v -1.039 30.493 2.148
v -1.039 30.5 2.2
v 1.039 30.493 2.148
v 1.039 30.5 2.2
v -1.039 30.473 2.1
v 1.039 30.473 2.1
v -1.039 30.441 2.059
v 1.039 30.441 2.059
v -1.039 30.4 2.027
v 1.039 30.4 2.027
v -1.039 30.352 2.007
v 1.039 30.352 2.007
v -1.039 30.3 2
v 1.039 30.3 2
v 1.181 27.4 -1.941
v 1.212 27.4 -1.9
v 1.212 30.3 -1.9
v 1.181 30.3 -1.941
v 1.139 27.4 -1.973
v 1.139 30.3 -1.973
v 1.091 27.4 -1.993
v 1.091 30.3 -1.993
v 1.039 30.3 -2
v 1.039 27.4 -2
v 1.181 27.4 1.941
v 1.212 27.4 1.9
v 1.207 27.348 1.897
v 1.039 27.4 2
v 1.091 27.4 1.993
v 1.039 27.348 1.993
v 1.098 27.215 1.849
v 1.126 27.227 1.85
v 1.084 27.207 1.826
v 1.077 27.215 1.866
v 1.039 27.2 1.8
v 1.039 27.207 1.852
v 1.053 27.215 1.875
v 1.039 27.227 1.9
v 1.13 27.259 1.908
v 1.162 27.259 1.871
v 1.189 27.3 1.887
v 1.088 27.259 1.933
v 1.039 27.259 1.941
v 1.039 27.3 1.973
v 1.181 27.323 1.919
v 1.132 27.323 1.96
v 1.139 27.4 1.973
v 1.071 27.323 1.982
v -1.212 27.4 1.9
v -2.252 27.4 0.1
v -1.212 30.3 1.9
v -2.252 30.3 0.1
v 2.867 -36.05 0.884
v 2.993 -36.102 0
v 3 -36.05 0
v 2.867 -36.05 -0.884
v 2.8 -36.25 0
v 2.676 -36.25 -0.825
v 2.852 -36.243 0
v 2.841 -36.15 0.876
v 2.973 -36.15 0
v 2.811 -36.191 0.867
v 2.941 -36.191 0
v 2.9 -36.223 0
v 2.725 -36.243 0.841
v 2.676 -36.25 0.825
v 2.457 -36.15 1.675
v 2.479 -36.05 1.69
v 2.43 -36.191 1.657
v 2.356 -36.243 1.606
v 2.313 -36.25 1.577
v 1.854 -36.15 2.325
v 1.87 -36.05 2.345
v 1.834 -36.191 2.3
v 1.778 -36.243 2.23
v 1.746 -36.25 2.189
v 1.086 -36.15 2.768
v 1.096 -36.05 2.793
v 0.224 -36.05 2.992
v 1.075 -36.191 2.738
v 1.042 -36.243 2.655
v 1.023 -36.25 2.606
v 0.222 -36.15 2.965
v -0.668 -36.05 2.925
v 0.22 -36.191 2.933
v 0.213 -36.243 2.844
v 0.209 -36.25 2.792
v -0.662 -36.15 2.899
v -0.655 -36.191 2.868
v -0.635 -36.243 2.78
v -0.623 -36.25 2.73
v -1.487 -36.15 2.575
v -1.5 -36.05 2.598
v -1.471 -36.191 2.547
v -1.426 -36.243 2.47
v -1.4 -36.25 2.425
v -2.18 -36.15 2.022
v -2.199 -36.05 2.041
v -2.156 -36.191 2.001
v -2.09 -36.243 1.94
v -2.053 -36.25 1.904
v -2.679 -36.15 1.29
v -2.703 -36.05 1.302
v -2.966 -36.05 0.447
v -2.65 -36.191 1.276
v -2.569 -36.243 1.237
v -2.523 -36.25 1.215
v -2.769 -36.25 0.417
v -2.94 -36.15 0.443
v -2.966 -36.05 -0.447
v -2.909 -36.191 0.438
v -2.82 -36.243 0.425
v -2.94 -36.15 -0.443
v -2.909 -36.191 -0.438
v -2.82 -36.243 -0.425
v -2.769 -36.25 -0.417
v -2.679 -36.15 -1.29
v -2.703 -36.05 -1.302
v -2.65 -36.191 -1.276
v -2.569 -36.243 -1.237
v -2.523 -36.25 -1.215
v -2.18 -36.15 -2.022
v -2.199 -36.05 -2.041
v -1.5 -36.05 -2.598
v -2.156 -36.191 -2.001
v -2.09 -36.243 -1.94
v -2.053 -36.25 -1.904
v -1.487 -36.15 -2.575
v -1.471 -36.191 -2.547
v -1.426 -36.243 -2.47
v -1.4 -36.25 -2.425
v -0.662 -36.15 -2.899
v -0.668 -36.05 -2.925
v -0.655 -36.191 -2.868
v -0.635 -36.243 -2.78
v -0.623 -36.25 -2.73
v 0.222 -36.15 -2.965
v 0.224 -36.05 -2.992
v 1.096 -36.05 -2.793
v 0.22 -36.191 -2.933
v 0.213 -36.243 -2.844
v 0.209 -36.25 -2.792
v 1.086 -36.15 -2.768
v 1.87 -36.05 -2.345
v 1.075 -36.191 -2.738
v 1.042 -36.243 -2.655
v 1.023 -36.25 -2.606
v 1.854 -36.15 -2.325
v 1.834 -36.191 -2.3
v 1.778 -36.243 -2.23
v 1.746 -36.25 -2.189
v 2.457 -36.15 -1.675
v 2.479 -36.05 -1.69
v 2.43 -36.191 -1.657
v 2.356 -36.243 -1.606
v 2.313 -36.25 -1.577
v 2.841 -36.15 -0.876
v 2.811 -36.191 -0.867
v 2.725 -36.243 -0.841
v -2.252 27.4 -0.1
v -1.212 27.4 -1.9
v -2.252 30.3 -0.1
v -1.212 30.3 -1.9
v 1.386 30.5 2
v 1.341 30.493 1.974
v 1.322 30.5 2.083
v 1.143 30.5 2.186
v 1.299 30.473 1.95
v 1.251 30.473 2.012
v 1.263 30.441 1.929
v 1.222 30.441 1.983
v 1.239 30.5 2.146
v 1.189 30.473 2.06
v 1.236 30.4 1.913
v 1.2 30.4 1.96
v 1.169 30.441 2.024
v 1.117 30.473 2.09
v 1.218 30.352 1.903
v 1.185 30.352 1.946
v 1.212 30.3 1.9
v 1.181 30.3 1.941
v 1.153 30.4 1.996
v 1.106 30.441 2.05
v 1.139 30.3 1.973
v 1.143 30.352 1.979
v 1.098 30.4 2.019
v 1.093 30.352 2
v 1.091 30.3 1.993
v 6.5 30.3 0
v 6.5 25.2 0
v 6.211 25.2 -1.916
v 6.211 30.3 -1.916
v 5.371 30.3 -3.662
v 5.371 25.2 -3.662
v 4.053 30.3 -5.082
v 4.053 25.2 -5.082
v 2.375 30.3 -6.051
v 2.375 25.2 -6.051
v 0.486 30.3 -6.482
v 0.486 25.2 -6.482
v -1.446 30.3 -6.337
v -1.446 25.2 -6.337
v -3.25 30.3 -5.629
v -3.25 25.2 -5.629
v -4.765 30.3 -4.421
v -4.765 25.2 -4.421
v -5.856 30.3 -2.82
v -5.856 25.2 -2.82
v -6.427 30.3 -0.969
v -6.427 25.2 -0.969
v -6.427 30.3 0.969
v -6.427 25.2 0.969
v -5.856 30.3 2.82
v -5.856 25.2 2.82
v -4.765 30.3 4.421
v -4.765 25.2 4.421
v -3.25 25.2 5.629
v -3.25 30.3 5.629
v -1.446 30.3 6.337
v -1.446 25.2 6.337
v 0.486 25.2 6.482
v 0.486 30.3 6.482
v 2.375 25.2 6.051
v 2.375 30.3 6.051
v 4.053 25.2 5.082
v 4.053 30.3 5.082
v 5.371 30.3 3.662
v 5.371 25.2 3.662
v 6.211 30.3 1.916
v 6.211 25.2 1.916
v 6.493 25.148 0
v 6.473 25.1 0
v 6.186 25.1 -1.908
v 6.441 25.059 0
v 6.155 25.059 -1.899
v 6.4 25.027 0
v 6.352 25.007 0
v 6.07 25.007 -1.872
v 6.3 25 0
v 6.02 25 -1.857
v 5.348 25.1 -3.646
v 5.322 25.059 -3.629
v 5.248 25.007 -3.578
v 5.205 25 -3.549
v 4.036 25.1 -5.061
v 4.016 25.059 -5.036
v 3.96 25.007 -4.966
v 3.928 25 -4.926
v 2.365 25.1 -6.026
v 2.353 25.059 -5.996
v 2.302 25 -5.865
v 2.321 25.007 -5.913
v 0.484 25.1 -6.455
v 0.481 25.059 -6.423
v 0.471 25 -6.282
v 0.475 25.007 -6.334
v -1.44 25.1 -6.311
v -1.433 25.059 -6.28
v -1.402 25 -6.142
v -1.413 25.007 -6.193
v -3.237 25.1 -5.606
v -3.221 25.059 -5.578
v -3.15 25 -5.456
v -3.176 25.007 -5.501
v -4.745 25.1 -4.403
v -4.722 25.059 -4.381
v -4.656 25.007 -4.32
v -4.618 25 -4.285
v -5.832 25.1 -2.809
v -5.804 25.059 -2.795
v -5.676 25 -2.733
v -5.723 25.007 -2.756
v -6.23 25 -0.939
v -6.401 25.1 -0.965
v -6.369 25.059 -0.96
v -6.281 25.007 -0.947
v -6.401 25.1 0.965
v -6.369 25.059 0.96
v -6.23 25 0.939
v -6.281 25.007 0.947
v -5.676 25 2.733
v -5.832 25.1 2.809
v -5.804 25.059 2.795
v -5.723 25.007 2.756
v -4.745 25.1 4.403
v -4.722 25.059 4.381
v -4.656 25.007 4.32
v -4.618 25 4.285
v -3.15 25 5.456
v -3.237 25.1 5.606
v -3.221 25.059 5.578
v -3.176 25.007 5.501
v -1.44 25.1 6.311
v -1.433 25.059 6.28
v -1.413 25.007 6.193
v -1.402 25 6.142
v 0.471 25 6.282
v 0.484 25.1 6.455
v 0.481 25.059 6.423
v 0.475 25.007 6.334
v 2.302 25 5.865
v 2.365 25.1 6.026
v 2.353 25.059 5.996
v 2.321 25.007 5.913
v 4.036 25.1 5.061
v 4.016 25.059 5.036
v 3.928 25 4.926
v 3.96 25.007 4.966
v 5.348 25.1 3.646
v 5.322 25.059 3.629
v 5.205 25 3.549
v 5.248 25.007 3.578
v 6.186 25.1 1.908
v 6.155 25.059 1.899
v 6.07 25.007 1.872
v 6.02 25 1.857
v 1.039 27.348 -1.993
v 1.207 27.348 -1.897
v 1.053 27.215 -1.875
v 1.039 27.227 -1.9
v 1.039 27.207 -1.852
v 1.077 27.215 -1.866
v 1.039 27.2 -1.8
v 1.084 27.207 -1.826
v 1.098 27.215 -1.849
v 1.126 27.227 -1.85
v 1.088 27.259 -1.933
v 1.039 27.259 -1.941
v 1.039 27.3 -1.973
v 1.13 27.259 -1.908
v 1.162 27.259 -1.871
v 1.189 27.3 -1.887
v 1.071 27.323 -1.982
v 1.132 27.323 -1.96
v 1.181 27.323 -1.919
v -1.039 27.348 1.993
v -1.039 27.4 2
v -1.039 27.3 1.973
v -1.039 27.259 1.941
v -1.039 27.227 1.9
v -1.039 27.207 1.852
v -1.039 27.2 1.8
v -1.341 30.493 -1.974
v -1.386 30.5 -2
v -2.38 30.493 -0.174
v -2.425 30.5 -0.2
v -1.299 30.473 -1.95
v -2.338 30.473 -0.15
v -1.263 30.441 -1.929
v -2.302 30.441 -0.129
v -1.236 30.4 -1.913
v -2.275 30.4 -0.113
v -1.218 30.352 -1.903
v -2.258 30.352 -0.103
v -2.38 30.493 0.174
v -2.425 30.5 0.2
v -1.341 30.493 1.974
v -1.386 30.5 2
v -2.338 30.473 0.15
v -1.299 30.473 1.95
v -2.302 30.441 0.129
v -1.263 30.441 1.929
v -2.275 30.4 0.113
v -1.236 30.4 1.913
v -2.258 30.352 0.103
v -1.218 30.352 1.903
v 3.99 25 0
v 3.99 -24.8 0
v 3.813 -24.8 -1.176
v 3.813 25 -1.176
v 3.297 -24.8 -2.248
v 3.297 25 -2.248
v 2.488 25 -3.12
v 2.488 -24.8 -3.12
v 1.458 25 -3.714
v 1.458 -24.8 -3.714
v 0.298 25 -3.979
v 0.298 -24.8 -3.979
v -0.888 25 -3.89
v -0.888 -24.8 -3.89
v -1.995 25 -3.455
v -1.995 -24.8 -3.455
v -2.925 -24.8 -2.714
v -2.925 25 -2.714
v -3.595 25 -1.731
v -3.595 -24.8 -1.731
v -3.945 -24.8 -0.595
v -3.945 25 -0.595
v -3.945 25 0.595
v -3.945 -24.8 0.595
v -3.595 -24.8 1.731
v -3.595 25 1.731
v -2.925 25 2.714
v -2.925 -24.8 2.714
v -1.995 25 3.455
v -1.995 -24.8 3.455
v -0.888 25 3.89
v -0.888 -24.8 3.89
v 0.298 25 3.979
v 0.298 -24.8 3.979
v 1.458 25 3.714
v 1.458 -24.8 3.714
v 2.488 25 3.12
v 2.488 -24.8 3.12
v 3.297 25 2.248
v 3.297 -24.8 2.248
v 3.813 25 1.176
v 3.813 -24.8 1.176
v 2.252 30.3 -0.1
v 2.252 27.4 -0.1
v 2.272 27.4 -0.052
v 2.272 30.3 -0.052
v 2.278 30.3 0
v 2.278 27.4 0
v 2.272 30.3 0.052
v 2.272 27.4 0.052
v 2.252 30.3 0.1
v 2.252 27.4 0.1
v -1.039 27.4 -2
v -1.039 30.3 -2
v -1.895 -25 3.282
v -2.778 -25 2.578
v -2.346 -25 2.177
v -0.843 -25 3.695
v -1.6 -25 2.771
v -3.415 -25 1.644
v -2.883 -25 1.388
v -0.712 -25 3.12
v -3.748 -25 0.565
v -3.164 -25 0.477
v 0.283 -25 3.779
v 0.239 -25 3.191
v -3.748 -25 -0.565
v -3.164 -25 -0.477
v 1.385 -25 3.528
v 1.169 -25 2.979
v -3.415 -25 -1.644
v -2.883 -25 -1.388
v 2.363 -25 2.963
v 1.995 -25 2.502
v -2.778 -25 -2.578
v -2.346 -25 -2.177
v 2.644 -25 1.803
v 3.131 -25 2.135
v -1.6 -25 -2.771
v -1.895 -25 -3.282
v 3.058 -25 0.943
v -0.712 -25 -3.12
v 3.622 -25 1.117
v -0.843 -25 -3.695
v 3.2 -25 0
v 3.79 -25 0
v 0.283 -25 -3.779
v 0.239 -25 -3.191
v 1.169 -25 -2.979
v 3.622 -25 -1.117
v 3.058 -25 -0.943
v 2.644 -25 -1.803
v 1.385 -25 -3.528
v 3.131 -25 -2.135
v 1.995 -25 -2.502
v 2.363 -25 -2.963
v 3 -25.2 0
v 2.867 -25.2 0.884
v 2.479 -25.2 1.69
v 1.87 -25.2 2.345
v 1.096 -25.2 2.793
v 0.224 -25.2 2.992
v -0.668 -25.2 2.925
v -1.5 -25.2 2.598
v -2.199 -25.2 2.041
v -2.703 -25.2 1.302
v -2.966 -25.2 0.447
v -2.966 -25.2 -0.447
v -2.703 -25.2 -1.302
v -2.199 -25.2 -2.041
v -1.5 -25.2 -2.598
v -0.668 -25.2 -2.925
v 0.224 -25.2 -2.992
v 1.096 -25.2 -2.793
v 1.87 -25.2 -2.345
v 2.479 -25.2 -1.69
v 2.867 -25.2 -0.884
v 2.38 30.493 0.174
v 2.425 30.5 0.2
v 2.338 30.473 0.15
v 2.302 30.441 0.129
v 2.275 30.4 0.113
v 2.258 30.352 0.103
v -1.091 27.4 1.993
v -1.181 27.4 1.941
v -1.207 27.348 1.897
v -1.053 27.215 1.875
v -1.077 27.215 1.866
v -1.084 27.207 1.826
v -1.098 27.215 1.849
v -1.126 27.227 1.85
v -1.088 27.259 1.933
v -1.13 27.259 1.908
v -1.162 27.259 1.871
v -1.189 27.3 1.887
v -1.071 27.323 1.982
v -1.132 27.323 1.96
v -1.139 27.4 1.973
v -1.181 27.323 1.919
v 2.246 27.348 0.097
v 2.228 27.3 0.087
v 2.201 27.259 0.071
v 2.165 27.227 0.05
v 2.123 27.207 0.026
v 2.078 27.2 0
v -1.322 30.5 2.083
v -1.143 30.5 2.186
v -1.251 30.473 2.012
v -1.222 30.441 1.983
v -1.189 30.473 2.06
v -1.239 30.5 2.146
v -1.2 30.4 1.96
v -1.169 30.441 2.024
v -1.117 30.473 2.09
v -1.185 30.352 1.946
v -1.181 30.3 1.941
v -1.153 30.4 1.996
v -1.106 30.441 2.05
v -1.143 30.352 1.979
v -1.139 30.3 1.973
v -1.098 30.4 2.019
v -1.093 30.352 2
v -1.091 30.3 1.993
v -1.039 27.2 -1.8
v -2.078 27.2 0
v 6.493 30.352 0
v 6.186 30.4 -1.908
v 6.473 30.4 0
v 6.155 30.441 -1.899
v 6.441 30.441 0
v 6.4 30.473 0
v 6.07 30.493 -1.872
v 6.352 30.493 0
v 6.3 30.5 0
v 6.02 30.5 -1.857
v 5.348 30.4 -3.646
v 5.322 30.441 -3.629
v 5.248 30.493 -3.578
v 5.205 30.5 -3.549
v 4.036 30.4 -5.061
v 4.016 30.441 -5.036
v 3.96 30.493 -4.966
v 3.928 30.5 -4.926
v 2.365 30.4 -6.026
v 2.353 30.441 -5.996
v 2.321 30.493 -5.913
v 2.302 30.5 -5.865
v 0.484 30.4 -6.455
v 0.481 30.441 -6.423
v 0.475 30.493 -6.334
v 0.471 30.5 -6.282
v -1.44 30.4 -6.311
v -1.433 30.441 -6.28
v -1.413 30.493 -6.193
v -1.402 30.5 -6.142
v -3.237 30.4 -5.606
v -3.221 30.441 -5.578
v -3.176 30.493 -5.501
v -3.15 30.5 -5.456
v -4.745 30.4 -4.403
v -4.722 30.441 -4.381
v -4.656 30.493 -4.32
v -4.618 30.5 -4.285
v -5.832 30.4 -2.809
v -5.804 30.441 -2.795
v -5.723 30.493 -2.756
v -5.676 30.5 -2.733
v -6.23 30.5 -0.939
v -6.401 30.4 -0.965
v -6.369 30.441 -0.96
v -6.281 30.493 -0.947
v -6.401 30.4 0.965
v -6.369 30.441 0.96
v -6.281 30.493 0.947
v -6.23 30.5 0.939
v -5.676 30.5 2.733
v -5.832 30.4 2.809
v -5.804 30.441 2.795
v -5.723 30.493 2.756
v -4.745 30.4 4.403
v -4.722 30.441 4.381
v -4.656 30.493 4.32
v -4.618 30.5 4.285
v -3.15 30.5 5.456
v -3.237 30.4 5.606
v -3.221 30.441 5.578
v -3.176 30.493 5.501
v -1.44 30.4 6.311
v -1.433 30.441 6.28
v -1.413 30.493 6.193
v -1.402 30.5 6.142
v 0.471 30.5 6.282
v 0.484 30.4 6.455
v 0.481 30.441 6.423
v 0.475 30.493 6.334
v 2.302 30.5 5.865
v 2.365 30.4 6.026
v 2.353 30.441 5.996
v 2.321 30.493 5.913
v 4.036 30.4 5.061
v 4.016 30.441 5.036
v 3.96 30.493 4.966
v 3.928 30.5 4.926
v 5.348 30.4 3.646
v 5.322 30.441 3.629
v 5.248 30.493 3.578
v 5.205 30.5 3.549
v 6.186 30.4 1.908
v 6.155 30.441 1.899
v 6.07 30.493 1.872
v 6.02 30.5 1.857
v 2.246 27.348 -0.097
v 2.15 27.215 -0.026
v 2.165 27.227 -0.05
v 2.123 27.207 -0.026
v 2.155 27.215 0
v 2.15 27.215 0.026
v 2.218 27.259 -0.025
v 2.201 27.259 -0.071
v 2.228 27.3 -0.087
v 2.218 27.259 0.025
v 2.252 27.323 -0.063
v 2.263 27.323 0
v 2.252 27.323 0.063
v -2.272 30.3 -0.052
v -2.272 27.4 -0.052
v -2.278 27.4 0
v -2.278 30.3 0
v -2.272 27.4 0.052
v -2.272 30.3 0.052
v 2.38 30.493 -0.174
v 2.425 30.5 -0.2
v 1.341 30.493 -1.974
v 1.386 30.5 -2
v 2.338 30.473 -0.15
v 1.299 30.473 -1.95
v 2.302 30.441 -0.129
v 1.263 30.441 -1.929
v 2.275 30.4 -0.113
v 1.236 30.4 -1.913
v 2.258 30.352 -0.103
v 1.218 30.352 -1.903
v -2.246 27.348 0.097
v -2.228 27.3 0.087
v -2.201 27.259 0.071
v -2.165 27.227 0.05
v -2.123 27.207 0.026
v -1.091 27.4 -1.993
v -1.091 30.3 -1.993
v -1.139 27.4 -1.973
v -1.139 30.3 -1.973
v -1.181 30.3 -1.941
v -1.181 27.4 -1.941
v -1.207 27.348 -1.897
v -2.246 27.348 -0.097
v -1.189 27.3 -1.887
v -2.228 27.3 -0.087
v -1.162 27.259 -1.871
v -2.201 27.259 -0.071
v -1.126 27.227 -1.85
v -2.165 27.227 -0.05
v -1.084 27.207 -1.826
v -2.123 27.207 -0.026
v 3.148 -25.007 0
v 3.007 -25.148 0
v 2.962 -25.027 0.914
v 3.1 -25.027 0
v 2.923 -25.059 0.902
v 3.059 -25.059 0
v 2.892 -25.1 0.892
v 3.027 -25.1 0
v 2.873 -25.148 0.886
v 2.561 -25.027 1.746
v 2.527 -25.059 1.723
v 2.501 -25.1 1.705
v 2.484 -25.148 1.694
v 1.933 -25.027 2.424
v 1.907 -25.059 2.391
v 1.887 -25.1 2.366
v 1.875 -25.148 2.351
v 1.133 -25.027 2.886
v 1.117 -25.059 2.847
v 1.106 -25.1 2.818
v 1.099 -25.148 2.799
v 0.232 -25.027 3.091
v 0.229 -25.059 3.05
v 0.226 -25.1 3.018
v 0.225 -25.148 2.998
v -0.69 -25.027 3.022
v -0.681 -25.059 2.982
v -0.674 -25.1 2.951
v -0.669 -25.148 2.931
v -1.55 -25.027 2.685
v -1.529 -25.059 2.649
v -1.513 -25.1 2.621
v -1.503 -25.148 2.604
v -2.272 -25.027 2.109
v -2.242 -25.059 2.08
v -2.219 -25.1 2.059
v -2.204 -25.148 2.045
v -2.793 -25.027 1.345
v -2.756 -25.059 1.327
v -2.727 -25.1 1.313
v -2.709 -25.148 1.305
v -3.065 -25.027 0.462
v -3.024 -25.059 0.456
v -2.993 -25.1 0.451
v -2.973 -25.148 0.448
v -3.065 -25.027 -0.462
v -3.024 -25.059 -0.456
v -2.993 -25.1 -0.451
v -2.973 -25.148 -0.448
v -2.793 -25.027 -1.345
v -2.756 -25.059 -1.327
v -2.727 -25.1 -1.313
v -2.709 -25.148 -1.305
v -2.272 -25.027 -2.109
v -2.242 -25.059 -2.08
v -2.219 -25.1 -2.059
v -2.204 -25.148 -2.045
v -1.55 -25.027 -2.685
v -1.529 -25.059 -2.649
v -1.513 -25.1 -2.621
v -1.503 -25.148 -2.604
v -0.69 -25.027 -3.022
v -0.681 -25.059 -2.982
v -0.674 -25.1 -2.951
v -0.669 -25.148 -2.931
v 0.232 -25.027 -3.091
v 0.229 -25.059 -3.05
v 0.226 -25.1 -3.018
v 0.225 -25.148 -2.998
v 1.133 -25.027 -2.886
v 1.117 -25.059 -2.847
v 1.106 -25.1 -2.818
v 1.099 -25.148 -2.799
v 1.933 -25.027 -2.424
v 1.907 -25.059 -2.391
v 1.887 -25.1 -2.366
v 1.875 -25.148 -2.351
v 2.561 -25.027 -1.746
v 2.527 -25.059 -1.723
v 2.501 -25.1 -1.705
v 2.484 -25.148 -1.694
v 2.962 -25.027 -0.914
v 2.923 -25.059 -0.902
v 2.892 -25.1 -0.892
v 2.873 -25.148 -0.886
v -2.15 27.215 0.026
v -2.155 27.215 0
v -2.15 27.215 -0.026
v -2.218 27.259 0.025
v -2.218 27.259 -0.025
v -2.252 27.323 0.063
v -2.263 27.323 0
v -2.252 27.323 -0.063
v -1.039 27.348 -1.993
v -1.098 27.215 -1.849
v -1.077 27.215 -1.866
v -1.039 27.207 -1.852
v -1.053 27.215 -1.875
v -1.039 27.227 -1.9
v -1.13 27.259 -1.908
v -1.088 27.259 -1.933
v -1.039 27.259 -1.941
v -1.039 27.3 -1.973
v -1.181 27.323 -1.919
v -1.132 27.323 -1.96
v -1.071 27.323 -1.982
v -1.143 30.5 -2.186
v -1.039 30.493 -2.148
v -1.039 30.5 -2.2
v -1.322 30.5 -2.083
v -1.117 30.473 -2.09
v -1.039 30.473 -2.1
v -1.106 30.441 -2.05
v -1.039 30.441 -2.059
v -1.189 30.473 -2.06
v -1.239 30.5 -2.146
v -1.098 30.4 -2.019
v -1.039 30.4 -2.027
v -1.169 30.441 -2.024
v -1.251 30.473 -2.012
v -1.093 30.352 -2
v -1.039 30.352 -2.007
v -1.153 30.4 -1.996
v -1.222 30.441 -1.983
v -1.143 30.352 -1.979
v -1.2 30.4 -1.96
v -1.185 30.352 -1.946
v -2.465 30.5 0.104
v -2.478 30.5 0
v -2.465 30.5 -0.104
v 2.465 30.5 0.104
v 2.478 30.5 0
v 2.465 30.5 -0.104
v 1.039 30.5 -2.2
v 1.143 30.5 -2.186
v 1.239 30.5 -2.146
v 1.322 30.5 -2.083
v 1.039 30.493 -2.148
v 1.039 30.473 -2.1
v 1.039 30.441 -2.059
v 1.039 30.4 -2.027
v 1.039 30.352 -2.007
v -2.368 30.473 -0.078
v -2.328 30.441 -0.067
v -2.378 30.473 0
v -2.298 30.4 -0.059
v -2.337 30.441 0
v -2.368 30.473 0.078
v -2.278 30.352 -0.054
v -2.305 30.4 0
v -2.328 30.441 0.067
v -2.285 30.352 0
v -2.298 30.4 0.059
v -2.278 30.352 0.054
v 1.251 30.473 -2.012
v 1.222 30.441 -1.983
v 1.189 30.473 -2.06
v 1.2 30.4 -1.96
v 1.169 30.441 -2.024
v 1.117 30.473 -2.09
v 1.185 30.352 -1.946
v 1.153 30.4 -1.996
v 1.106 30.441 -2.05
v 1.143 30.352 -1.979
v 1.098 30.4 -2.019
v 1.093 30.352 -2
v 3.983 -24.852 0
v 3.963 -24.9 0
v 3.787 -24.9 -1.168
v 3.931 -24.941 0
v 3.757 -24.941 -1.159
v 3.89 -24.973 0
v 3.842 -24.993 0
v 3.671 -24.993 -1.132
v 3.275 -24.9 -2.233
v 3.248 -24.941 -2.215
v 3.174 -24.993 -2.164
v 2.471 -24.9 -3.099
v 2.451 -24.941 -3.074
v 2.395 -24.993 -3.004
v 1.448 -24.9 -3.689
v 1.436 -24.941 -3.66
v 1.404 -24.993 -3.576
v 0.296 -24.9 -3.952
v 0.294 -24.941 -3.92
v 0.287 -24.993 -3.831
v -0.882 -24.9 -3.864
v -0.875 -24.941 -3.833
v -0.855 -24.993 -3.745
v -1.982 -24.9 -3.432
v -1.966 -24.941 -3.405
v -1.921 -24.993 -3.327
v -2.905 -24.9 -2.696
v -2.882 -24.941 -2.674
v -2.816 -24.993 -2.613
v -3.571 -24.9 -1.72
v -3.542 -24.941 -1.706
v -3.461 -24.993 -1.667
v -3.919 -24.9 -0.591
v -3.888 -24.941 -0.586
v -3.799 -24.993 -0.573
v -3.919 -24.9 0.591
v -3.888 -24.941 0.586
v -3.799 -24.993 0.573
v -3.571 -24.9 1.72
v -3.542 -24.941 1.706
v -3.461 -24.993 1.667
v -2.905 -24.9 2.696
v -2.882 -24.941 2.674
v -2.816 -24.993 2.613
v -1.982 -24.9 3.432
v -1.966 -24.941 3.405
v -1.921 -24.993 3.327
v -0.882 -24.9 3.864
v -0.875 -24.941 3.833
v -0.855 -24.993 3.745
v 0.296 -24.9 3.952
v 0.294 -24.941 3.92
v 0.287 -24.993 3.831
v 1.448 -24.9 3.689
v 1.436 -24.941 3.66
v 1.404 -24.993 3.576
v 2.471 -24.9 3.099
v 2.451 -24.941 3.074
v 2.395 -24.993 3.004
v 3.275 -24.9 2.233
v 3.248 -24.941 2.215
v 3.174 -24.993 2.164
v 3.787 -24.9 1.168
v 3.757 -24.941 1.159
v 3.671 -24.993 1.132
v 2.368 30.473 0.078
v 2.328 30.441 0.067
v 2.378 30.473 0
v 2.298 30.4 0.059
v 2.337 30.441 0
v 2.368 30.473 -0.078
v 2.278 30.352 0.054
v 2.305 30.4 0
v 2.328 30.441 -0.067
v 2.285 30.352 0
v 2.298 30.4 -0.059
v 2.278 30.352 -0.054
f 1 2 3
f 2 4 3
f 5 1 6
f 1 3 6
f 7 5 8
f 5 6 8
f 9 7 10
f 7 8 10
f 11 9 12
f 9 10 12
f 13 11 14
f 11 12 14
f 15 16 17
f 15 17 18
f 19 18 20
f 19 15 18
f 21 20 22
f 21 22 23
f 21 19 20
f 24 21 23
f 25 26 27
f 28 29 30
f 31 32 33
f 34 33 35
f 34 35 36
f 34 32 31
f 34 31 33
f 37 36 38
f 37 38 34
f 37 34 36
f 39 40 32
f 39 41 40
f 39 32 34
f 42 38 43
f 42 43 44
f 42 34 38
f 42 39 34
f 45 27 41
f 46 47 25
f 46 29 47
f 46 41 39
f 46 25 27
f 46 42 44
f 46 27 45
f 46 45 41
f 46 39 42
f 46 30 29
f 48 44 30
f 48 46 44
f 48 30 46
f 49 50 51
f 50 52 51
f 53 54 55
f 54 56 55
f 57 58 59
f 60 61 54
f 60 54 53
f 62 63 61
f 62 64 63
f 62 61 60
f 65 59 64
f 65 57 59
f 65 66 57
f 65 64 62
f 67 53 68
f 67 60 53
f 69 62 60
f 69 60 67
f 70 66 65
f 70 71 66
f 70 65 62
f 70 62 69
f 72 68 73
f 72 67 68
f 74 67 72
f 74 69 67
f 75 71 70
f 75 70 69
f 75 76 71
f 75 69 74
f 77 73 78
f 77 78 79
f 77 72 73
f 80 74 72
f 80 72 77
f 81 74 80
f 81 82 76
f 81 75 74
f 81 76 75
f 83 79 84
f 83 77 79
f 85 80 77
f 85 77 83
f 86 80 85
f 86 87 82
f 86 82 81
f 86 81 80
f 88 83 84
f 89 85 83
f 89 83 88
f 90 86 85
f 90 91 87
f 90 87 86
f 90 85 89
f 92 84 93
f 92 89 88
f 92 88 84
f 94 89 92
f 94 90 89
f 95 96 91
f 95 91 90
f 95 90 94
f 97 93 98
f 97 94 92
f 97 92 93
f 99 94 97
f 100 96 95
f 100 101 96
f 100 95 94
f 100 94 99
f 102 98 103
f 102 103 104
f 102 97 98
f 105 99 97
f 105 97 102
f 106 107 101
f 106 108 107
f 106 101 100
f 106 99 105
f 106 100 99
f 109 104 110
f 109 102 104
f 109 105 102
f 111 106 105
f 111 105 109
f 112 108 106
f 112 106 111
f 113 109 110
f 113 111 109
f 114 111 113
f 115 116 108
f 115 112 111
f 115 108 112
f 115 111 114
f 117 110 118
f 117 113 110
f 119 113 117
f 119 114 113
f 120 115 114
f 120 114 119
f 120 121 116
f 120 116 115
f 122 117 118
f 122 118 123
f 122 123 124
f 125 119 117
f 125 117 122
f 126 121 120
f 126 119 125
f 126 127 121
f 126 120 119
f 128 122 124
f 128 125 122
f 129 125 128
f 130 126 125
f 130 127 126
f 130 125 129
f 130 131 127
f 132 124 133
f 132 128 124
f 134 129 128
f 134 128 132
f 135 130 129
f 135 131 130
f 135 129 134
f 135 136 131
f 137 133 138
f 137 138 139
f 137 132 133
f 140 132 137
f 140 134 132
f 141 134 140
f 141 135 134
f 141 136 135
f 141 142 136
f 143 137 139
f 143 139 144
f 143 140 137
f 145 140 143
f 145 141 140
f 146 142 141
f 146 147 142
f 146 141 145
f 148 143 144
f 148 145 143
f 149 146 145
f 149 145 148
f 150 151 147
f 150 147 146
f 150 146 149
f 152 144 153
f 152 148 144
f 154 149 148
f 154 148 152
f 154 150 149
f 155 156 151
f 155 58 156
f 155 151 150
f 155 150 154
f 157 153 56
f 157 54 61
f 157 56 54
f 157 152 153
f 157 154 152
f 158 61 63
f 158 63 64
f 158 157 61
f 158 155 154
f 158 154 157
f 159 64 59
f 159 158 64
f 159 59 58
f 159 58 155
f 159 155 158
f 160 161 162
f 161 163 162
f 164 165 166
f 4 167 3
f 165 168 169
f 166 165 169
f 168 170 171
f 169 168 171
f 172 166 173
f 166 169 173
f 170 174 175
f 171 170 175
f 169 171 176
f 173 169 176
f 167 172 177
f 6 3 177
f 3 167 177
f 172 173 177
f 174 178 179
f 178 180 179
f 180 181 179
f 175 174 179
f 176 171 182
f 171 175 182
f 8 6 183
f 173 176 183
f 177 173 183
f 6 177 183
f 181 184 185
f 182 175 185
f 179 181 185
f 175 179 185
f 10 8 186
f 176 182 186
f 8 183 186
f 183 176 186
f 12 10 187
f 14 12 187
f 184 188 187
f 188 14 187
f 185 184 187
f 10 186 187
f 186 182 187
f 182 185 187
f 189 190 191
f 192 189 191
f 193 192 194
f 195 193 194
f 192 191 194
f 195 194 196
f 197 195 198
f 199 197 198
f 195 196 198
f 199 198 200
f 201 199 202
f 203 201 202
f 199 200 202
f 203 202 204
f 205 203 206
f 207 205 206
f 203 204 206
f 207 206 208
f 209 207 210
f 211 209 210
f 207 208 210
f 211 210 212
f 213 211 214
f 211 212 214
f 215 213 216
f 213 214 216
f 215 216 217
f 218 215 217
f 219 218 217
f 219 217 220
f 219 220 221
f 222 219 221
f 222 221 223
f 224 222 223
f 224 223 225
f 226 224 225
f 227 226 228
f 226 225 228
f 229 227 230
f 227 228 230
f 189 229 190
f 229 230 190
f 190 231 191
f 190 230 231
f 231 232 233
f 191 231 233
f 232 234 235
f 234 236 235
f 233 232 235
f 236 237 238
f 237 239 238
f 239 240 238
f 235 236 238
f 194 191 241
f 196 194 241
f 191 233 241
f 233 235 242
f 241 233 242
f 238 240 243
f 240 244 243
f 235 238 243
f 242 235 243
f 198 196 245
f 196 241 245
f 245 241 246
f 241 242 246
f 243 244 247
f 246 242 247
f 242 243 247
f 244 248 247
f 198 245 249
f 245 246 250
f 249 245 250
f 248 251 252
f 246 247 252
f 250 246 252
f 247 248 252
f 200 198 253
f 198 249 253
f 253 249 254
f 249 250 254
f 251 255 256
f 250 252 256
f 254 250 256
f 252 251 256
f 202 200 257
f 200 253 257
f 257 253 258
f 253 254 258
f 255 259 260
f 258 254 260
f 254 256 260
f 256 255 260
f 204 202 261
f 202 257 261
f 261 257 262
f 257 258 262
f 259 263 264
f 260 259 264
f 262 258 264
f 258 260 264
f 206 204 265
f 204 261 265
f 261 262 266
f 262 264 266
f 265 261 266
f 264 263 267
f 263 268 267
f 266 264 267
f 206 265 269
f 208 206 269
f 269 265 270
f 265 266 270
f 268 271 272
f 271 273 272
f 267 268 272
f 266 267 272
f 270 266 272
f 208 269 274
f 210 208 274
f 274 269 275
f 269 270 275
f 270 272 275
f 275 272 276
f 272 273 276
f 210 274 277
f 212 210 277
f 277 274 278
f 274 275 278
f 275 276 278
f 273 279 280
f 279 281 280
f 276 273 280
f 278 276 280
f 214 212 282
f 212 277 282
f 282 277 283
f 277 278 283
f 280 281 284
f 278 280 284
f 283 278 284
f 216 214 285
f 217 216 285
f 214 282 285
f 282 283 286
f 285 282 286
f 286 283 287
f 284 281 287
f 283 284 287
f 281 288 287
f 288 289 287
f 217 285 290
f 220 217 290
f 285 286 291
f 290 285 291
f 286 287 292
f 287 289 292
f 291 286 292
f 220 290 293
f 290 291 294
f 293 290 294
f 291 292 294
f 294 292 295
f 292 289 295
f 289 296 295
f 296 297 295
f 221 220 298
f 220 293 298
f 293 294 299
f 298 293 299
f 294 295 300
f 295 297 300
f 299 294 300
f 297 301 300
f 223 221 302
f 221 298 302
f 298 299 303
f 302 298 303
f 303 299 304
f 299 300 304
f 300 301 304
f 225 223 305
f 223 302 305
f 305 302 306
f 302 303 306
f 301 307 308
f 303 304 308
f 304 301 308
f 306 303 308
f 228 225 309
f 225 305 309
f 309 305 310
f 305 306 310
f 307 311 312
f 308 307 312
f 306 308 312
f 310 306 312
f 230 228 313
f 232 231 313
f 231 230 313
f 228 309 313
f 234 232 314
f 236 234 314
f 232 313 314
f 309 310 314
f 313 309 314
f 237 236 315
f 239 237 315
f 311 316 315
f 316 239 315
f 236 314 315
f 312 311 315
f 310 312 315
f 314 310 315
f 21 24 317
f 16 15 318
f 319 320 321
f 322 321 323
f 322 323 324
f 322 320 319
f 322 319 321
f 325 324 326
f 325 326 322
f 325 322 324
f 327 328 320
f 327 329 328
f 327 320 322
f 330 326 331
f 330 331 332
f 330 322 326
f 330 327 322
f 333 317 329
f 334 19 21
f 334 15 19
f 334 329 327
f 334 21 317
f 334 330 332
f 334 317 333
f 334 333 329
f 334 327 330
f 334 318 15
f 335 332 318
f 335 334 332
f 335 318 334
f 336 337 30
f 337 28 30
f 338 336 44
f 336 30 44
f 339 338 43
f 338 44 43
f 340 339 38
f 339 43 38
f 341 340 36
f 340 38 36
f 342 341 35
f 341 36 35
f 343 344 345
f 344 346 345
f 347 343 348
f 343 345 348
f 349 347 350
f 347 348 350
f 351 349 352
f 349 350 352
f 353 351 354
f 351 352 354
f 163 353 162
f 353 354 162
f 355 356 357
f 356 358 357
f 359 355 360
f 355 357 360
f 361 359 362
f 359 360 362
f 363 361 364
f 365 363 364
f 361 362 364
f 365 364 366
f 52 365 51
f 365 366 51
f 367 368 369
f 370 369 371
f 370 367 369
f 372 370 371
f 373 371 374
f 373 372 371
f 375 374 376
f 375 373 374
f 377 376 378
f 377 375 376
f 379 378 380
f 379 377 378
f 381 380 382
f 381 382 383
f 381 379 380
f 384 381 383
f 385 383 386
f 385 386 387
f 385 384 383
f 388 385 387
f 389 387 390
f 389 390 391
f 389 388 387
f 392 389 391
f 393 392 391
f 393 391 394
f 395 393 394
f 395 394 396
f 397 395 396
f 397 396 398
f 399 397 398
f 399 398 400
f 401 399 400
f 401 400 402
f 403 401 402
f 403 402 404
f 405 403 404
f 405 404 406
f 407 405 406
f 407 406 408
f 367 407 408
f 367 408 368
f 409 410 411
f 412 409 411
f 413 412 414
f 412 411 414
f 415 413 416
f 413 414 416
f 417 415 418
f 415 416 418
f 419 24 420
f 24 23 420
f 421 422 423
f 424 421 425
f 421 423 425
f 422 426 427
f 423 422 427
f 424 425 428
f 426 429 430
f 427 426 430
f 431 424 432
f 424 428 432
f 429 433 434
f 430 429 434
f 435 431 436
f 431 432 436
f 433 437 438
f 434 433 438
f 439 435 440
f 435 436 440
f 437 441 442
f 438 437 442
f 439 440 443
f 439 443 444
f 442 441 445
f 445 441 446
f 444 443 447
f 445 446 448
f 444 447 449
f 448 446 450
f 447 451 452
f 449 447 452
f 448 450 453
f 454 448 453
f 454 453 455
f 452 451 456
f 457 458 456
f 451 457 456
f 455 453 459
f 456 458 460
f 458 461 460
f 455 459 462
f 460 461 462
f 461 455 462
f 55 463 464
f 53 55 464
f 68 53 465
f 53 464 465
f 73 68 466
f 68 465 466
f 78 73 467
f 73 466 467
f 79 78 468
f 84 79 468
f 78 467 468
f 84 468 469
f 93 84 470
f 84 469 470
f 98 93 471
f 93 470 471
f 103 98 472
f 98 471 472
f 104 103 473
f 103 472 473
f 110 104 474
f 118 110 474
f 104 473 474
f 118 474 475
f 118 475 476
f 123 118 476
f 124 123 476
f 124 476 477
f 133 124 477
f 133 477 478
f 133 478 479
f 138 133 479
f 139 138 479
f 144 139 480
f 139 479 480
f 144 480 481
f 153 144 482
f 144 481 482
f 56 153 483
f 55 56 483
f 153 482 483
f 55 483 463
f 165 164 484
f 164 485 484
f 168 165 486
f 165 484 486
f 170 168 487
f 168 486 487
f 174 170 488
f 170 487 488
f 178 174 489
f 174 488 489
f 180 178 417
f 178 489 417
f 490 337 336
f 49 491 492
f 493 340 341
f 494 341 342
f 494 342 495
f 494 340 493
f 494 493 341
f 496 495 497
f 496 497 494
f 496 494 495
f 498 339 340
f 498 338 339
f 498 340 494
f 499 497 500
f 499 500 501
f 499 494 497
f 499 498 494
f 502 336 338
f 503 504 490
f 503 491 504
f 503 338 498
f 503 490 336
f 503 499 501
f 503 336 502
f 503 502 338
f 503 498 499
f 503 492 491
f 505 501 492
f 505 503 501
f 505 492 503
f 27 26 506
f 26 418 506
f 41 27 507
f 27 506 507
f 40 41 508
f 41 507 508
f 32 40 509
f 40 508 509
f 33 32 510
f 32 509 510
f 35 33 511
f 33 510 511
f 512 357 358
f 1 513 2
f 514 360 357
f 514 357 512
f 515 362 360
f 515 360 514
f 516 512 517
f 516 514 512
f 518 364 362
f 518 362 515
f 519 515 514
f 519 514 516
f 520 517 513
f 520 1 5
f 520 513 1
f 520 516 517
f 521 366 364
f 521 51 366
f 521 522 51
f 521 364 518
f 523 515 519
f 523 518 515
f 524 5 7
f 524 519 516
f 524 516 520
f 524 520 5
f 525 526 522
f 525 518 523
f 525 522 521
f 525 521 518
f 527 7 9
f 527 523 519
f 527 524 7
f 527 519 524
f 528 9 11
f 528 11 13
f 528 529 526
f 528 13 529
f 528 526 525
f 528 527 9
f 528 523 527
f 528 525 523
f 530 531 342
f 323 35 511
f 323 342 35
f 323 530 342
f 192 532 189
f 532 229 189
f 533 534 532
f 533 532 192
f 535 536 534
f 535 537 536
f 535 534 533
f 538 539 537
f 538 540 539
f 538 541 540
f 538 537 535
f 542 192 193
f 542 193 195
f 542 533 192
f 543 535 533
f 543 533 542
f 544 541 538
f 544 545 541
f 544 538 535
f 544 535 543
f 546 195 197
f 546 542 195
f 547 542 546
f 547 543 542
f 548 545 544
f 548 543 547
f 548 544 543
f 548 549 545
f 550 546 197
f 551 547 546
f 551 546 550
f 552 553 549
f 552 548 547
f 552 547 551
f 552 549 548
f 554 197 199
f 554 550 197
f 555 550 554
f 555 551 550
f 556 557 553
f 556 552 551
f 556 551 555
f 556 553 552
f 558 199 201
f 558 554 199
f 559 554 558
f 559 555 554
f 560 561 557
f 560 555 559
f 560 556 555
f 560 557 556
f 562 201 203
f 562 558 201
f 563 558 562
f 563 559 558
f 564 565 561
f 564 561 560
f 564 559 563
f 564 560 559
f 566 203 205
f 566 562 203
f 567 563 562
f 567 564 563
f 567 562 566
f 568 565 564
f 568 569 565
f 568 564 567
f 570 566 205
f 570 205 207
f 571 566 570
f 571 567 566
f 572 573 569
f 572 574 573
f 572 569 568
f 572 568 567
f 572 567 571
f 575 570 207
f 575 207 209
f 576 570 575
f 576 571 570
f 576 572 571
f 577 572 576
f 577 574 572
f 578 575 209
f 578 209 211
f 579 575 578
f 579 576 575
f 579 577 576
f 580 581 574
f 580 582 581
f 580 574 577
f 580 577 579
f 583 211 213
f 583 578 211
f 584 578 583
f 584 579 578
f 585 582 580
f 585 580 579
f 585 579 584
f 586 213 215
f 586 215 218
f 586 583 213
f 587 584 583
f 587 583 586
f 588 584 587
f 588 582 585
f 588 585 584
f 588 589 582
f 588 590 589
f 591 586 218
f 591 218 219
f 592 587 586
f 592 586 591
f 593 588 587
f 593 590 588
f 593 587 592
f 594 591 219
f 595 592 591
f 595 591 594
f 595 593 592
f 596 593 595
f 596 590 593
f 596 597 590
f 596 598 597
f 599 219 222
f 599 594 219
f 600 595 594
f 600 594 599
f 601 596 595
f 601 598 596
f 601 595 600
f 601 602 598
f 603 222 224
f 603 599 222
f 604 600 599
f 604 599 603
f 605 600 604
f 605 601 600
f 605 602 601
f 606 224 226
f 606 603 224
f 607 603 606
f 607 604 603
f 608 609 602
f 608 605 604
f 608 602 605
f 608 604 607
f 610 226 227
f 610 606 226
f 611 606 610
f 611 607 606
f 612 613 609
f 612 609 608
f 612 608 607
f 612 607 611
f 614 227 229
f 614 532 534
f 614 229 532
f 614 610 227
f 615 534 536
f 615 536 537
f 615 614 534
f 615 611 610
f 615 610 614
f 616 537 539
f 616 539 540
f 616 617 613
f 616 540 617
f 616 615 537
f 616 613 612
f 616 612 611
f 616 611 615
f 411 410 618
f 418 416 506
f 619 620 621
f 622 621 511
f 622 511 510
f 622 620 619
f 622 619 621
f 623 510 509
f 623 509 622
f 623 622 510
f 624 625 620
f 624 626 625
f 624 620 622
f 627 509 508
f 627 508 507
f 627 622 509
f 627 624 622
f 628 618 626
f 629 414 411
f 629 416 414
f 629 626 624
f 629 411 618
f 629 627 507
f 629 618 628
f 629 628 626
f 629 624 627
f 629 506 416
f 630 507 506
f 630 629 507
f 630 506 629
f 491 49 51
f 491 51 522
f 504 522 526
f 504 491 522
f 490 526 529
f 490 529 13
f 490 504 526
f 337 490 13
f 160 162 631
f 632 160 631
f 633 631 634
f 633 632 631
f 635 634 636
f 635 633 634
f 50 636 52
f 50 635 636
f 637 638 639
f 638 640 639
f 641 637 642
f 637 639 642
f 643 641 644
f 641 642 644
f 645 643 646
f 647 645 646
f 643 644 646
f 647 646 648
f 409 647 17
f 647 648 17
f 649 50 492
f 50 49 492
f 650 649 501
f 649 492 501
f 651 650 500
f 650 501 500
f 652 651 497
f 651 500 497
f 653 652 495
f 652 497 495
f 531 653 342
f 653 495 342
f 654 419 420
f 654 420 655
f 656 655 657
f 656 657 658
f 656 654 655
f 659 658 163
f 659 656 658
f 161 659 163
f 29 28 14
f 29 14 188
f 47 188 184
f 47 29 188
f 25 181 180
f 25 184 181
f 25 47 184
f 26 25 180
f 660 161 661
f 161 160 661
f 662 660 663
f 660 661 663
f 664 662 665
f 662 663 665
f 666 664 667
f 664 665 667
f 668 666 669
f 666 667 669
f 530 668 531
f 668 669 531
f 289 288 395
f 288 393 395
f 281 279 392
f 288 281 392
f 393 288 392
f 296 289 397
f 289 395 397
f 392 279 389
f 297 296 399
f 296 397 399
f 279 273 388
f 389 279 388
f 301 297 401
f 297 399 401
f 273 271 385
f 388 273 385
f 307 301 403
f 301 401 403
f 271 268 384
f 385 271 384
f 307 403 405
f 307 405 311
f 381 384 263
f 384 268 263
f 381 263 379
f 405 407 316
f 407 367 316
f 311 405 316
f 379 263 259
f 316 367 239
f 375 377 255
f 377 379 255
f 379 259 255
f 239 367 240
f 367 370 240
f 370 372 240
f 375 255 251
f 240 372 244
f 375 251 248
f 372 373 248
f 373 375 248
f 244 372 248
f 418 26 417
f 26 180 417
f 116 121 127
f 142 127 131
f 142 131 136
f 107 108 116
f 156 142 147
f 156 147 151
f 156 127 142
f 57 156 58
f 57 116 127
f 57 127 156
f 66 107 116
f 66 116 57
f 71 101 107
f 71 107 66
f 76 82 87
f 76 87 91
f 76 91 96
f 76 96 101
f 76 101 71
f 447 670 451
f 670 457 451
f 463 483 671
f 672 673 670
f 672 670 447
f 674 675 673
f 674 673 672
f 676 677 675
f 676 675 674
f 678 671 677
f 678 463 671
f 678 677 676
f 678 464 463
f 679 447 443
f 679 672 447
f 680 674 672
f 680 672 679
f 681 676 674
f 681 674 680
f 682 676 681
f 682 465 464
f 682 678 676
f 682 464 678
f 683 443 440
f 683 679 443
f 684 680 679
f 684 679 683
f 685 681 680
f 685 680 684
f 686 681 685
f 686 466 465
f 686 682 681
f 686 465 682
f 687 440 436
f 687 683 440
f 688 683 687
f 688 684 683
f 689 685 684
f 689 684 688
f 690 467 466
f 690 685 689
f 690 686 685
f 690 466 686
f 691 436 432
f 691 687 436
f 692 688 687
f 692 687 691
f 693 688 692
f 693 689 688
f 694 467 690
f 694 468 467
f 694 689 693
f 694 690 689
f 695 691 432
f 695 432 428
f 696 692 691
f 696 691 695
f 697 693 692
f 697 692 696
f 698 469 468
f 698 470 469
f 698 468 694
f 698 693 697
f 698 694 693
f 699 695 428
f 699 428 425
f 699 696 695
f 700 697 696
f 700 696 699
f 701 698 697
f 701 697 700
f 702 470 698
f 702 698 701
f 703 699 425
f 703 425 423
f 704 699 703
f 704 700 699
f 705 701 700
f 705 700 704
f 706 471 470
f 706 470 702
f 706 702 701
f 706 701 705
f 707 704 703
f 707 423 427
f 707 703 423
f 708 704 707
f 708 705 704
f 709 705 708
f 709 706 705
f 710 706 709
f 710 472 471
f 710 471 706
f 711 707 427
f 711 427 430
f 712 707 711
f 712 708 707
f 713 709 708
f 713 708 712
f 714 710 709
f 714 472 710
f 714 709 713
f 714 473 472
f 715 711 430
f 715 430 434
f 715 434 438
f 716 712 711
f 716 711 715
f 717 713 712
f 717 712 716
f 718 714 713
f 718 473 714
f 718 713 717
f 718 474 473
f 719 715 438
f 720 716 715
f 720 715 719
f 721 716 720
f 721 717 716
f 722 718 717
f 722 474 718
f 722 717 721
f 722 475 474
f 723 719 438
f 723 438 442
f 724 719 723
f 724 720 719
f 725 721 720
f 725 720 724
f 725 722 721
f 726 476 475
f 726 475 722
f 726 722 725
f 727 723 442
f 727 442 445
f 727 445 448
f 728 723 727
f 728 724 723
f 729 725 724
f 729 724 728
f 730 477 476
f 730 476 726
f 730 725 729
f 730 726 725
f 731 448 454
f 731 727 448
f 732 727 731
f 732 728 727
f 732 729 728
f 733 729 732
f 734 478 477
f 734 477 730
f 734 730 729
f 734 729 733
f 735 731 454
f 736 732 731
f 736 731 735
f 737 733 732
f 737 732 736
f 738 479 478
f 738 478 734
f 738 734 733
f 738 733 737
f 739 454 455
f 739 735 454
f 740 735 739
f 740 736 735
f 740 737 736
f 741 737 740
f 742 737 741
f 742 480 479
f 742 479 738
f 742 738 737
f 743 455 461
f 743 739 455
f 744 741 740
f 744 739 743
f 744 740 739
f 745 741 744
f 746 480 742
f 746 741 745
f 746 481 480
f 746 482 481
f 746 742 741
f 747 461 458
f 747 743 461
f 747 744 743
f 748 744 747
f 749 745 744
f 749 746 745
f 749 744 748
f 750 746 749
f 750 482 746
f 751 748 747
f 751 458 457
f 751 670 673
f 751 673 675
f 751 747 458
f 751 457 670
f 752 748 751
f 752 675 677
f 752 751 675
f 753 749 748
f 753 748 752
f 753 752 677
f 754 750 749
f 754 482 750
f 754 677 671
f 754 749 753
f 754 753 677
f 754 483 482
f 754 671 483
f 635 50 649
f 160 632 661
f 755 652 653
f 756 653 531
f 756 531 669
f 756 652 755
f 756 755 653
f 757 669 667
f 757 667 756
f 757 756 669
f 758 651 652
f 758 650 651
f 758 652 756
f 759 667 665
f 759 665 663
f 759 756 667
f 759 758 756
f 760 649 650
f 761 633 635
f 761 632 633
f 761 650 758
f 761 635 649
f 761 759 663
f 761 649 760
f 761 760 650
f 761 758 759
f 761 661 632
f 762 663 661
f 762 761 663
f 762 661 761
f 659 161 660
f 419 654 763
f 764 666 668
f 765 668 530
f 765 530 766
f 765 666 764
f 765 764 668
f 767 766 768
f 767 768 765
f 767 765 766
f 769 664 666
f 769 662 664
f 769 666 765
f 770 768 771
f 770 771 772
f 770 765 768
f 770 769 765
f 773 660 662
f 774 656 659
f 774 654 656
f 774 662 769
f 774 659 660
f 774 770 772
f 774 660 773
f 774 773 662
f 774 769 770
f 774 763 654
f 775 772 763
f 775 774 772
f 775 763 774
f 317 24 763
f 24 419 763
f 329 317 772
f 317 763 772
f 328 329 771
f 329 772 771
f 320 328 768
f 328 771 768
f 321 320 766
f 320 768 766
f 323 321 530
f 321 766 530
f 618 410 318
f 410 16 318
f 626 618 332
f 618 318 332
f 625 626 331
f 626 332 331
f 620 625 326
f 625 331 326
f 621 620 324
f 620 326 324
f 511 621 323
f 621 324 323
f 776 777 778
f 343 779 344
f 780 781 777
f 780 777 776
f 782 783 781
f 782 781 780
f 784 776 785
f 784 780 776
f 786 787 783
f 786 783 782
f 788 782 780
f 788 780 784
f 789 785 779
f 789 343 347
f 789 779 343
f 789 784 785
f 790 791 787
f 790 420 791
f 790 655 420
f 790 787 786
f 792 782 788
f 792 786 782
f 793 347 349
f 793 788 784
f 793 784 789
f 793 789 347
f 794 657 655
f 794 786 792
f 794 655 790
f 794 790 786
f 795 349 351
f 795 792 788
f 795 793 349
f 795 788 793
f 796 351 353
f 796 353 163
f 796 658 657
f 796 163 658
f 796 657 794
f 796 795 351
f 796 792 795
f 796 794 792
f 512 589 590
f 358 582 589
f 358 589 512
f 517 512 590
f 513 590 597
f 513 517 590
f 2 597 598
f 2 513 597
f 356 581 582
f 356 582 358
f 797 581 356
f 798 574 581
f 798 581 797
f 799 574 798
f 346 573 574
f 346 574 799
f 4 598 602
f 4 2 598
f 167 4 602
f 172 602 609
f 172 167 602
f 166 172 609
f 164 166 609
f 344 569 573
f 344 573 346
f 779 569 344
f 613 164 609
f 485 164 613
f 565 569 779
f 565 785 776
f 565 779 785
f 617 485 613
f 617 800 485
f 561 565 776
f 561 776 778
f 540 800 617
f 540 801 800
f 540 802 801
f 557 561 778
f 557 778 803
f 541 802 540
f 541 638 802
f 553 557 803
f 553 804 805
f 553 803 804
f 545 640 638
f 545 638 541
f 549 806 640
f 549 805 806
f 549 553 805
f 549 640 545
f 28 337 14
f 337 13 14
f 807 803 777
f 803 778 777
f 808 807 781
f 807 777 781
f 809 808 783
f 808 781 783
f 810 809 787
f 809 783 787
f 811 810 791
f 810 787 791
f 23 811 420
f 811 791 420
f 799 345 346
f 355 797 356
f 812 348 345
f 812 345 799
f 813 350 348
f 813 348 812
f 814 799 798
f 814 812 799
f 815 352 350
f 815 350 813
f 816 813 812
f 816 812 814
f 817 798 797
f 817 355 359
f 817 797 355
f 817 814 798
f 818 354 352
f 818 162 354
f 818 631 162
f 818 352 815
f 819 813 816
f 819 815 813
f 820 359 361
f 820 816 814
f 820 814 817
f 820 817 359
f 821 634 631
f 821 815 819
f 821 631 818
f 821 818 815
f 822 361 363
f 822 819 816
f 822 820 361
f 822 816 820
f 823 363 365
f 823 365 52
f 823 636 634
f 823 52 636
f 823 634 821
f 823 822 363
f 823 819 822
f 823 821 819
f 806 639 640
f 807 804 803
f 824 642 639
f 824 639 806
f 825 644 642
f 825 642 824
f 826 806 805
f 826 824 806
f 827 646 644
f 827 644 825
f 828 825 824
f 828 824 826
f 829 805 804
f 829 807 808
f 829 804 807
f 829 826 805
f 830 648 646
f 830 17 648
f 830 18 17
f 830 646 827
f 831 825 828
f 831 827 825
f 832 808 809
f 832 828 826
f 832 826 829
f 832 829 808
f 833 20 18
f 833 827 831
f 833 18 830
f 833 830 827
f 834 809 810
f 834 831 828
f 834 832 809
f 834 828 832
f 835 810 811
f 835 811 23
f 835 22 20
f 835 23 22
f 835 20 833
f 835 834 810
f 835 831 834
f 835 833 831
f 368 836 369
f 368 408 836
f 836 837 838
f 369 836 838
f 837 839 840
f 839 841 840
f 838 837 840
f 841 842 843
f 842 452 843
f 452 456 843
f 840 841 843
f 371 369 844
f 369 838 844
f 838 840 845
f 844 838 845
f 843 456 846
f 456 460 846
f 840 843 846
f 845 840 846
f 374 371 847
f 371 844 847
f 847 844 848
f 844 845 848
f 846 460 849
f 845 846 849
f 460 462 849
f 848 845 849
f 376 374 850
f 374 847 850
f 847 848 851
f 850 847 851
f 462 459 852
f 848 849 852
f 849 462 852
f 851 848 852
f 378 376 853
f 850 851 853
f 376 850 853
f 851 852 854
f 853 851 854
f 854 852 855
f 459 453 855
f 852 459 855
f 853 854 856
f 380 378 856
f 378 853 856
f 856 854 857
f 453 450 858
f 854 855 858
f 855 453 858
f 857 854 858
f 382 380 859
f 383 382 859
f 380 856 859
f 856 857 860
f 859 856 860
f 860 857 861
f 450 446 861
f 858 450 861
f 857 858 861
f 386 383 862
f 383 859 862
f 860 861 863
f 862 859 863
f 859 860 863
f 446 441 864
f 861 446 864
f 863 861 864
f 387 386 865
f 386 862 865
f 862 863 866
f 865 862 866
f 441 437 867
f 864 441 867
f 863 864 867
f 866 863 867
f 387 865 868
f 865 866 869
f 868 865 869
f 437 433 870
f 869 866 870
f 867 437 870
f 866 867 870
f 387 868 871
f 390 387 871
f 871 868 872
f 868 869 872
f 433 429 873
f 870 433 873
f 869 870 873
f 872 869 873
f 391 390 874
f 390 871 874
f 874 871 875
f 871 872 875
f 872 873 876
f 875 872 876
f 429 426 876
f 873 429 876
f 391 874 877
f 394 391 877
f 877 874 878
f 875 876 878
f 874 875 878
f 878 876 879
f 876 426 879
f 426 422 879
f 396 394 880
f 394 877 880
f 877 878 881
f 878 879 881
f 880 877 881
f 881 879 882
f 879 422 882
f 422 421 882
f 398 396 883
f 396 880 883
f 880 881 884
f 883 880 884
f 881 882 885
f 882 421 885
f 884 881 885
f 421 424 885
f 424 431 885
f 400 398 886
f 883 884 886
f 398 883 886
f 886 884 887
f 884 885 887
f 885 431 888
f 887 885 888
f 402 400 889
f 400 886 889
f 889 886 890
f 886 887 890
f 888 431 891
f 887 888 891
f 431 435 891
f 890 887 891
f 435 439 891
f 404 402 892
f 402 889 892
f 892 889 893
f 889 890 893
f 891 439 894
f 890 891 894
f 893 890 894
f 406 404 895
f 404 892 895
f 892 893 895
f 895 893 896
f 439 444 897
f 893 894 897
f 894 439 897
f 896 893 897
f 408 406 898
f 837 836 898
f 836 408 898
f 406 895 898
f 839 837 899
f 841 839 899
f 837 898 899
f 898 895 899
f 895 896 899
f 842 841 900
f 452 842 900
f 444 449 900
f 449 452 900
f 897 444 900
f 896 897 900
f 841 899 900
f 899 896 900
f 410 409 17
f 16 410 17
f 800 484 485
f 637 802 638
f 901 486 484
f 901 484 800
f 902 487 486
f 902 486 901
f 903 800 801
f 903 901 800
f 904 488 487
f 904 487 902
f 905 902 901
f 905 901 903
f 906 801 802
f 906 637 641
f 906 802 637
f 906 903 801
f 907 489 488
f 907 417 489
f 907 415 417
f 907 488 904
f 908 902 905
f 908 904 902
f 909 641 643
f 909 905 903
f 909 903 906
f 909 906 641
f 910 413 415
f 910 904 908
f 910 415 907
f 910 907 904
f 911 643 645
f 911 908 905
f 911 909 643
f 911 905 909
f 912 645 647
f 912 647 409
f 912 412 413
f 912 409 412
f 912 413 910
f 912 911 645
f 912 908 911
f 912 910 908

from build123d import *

# Parameters (mm, degrees)
SKETCH_1_R          = 3.99
EXTRUDE_1_DEPTH     = 25
SKETCH_2_R          = 6.5
EXTRUDE_2_DEPTH     = 5.5
CUT_EXTRUDE_1_DEPTH = 3.3
SKETCH_4_R          = 3
EXTRUDE_3_DEPTH     = 11.25
FILLET_1_R          = 0.2


with BuildPart() as part:
    # 草图1 → 凸台-拉伸1 (new body, symmetric)
    with BuildSketch(Plane(origin=(0, 0, 0), x_dir=(1, 0, 0), z_dir=(0, 1, 0))):
        Circle(SKETCH_1_R)
    extrude(amount=EXTRUDE_1_DEPTH, both=True)

    # 草图2 → 凸台-拉伸2 (add)
    with BuildSketch(Plane(origin=(0, 25, 0), x_dir=(1, 0, 0), z_dir=(0, 1, 0))):
        Circle(SKETCH_2_R)
    extrude(amount=EXTRUDE_2_DEPTH)

    # 草图3 → 切除-拉伸1 (cut)
    with BuildSketch(Plane(origin=(0, 30.5, 0), x_dir=(1, 0, 0), z_dir=(0, 1, 0))):
        Polygon((2.309401077, 0), (1.154700538, 2), (-1.154700538, 2), (-2.309401077, 0), (-1.154700538, -2), (1.154700538, -2), align=None)
    extrude(amount=-CUT_EXTRUDE_1_DEPTH, mode=Mode.SUBTRACT)

    # 草图4 → 凸台-拉伸3 (add)
    with BuildSketch(Plane.XZ.offset(25)):
        Circle(SKETCH_4_R)
    extrude(amount=EXTRUDE_3_DEPTH)

    # 圆角1
    fillet_1_edges = [part.edges().sort_by_distance(p)[0] for p in [
        (1.732050808, 27.2, 1),
        (2.309401077, 28.85, 0),
        (0, 27.2, 2),
        (1.154700538, 28.85, 2),
        (-1.732050808, 27.2, 1),
        (-1.154700538, 28.85, 2),
        (-1.732050808, 27.2, -1),
        (-2.309401077, 28.85, 0),
        (0, 27.2, -2),
        (-1.154700538, 28.85, -2),
        (1.732050808, 27.2, -1),
        (1.154700538, 28.85, -2),
        (1.732050808, 30.5, 1),
        (1.732050808, 30.5, -1),
        (0, 30.5, -2),
        (-1.732050808, 30.5, -1),
        (-1.732050808, 30.5, 1),
        (0, 30.5, 2),
        (-3, -25, 0),
        (-3, -36.25, 0),
        (-3.99, -25, 0),
        (-6.5, 25, 0),
        (-6.5, 30.5, 0),
    ]]
    fillet(fillet_1_edges, radius=FILLET_1_R)


solid = part.part
